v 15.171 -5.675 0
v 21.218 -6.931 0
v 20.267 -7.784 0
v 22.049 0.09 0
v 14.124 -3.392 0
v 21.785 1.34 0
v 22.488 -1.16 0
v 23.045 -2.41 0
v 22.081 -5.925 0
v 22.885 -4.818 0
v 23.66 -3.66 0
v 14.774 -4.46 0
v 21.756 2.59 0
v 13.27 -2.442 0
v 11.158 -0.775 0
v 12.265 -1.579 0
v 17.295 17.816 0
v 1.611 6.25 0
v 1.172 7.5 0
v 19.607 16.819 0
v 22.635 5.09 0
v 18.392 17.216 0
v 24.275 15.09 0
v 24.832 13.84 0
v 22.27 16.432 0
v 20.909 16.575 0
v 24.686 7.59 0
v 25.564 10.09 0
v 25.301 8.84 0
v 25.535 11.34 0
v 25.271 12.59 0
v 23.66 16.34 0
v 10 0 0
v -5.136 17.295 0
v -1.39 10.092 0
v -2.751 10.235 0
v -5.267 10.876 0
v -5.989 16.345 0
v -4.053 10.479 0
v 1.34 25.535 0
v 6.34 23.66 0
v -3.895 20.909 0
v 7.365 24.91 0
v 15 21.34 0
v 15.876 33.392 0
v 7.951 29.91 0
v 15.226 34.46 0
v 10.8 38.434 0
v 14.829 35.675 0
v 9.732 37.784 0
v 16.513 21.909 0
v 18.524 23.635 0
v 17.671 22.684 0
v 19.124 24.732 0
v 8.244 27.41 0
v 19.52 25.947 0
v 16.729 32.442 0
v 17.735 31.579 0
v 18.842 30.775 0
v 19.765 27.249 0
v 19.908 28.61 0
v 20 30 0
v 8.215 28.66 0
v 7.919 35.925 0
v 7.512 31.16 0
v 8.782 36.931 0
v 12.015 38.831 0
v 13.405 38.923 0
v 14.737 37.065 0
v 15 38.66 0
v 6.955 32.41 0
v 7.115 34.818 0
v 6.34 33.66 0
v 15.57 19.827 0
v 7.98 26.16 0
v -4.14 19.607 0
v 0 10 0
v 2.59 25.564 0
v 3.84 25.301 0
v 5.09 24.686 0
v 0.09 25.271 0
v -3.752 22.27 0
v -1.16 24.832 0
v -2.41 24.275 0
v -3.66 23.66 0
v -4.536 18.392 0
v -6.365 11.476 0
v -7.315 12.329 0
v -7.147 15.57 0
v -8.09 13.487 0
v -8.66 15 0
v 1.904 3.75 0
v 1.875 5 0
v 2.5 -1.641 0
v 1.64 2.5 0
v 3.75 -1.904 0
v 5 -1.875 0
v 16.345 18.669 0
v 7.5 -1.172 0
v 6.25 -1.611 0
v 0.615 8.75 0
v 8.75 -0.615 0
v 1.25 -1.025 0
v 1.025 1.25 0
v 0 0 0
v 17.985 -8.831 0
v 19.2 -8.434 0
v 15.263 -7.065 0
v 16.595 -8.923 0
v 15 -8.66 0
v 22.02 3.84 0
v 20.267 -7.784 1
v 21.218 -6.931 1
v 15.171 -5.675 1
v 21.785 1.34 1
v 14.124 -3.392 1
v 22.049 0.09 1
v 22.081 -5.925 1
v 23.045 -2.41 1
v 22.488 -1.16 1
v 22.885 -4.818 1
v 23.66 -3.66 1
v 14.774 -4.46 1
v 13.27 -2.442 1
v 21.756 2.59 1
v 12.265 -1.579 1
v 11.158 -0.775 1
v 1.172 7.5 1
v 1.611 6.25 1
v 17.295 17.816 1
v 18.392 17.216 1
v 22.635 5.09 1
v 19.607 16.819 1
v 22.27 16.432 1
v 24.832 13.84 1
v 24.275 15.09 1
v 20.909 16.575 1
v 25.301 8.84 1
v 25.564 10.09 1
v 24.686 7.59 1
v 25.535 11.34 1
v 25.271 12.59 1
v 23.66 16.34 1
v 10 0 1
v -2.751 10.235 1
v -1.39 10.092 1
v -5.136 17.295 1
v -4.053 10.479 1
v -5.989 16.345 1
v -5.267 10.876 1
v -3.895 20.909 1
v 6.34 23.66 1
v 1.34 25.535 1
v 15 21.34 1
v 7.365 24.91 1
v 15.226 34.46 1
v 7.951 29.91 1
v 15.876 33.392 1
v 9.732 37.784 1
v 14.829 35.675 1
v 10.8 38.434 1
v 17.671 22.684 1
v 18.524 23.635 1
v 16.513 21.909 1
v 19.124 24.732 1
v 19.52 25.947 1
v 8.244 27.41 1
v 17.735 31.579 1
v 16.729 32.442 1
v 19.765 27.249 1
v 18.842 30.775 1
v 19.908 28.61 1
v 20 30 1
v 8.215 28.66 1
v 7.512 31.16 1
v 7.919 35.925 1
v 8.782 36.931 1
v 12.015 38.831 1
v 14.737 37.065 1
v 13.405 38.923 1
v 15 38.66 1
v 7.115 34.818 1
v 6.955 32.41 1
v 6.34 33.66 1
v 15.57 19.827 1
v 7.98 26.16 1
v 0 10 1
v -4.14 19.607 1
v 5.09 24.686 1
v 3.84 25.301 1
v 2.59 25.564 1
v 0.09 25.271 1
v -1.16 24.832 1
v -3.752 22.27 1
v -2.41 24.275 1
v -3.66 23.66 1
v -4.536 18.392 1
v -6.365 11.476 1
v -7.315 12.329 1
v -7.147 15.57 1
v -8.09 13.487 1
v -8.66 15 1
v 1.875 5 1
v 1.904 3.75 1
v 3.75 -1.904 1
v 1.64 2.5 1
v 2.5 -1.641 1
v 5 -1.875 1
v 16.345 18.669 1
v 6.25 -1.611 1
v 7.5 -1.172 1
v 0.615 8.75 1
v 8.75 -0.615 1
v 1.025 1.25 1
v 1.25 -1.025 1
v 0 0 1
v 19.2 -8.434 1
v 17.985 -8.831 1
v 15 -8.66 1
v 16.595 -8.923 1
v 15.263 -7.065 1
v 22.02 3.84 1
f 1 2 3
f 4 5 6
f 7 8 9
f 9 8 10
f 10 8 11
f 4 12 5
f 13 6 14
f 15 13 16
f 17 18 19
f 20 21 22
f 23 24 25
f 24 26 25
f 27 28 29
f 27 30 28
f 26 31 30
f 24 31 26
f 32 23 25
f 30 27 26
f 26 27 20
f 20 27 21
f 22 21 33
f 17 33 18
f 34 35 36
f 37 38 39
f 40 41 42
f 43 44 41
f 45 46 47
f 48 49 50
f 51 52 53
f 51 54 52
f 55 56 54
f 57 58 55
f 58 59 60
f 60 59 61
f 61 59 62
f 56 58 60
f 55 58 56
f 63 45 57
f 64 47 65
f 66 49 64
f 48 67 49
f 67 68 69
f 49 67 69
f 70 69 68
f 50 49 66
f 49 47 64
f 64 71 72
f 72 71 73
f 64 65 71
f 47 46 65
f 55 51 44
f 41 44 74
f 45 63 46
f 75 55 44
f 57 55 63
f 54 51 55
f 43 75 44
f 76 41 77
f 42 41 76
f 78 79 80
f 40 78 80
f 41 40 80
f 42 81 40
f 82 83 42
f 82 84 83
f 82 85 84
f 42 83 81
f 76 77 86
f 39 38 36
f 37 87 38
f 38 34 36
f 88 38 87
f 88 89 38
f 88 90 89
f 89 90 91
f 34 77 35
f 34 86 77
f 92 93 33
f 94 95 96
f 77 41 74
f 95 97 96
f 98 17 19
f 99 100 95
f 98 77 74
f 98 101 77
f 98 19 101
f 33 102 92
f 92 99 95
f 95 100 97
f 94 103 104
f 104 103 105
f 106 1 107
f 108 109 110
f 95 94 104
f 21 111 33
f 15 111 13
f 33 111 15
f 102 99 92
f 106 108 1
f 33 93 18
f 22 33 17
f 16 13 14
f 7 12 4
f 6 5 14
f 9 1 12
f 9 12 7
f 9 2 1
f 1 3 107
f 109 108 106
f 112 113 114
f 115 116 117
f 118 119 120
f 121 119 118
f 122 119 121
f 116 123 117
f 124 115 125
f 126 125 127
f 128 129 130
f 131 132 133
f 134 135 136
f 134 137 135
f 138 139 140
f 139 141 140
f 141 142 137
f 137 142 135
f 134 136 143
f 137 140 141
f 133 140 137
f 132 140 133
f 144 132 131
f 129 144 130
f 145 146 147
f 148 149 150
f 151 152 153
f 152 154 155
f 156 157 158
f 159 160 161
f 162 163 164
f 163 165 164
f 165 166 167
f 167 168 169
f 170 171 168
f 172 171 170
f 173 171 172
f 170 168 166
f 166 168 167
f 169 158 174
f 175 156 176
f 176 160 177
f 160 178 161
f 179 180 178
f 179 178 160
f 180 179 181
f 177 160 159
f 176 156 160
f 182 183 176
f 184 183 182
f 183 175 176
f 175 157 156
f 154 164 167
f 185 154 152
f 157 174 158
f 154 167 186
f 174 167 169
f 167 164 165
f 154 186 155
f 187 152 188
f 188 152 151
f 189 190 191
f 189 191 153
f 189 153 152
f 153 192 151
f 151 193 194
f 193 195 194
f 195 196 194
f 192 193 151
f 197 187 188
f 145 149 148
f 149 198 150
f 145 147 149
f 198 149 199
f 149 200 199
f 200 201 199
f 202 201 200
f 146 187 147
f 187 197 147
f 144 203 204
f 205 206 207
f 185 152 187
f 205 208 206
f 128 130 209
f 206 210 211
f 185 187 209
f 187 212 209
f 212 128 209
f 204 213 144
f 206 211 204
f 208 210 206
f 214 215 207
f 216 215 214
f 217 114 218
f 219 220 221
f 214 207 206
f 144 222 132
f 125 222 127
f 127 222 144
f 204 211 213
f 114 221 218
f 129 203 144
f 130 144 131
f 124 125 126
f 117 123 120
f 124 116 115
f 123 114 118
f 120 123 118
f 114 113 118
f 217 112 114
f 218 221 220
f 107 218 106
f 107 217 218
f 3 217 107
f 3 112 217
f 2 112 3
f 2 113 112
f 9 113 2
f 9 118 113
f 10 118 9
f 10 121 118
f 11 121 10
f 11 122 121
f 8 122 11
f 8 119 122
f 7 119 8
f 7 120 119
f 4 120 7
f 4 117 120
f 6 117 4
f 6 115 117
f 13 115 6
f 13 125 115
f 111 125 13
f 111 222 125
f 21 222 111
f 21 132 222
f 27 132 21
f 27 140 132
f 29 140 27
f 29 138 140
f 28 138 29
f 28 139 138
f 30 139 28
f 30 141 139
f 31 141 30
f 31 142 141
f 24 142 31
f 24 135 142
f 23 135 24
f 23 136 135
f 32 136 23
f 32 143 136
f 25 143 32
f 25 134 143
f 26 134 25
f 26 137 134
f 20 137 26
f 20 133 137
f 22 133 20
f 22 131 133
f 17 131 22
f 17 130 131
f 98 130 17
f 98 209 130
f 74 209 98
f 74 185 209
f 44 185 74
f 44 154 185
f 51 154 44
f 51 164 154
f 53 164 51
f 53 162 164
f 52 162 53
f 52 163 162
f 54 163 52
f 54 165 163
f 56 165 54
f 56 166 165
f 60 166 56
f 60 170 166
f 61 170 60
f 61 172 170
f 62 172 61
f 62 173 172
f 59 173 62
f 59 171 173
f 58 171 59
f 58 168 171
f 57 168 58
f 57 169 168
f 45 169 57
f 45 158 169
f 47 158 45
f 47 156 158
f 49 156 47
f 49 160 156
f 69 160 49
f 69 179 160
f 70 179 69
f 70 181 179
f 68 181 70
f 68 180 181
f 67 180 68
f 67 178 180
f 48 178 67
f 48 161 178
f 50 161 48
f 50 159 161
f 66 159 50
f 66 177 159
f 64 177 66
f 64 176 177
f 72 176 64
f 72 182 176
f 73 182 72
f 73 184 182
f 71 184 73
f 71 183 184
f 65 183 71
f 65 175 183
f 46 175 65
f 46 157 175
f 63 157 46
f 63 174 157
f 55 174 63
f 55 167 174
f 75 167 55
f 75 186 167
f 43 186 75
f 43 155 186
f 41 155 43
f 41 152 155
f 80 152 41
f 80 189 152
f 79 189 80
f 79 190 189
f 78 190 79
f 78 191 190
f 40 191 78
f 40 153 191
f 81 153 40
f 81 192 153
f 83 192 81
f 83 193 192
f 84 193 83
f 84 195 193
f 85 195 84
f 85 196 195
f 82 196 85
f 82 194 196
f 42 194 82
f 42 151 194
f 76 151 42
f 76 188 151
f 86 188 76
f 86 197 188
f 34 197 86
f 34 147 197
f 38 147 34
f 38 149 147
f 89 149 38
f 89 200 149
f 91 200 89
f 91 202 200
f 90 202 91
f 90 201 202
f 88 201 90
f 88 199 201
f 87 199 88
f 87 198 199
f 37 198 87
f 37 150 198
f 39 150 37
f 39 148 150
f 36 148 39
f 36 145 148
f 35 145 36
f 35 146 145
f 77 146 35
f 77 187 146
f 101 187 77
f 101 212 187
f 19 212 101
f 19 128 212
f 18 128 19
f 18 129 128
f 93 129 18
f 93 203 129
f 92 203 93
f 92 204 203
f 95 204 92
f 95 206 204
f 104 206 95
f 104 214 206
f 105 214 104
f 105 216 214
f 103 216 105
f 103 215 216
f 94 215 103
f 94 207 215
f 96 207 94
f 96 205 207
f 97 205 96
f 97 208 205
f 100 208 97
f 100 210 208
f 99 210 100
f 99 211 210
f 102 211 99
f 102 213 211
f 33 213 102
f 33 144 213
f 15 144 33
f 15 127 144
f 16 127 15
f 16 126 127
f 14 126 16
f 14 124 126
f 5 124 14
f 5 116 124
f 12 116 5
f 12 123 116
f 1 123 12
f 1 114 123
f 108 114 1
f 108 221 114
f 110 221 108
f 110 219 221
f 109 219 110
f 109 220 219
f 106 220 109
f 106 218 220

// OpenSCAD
// OpenSCAD geometry of Tile(1,1) which leads to the spectre tile
// Jeffery Spirko, spirko@gmail.com, GPL 3.0

// Ref: https://arxiv.org/pdf/2305.17743.pdf
//      authors: David Smith, Joseph Samuel Myers,
//               Craig S. Kaplan, and Chaim Goodman-Strauss
//      Figure 1.1, left

linear_extrude(1) scale(10) spectre2();

// According to the paper, each side is the same length.
// Each side is along an axis or at a 30 degree angle to an axis.
// So each displacement is at an angle of 30*k, where k is an integer.
// kvals was determined visupally from the figure.
kvals = [ 0, -2, 1, 3, 3, 5, 2, 4, 7, 9, 6, 8, 11, 9 ];
sines = [ for (angle = kvals*30) sin(angle) ];
cosines = [ for (angle = kvals*30) cos(angle) ];
displacements = [ for(i=0; i<len(kvals); i=i+1) 
                    [ cosines[i], sines[i] ] ];

// Roughly based on cumulative sum from
//  https://en.wikibooks.org/wiki/OpenSCAD_User_Manual/Tips_and_Tricks
//  and requires version 2019.05 or newer.
//  Modifications:
//    This starts at [0,0] not the first element.
//    Each curpos is calculated from the current displacement.
//  Note: the result of adding the last displacement isn't returned.
points = [ for(i=0, curpos=[0,0];
               i<len(kvals);
               curpos=curpos+displacements[i], i=i+1)
             curpos ];

module spectre() {
  polygon(points);
}

// In the Smith, et al. paper, Figure 1.1, right, it looks like
//   they modified the sides to be a cubic,
//   for example f(x) = x*(x-1)*(x-2)/2.
// n is the number of minor points between major points
module spectre2(n=8) {
  polygon([ for (i=[0:len(points)-1])
    each let(p_i = points[i], p_j = points[(i+1)%len(points)])
      spoosh(p_i, p_j, n, order=(i%2==0))
  ]);
}

// Named spoosh to avoid a possible trademark.
function spoosh(p1, p2, n=20, order=0) = 
  [for(i=[0:n-1])
    spoosh_i(p1, p2, n, i, order)
  ];

// spoosh_i interpolates between p1 and p2, adding a sideways
//   swing according to spoosh_f(x).  Every other point has
//   the swing inverted.
function spoosh_i(p1, p2, n, i, order=0) = 
  let(displacement = p2 - p1,
      perp = [displacement.y, -displacement.x])
    p1 + displacement * i/n +
      (order?1:-1) * perp * spoosh_f(order?i/n:((n-i)/n));

function spoosh_f(x) = x*(x-1)*(x-2)/2;
